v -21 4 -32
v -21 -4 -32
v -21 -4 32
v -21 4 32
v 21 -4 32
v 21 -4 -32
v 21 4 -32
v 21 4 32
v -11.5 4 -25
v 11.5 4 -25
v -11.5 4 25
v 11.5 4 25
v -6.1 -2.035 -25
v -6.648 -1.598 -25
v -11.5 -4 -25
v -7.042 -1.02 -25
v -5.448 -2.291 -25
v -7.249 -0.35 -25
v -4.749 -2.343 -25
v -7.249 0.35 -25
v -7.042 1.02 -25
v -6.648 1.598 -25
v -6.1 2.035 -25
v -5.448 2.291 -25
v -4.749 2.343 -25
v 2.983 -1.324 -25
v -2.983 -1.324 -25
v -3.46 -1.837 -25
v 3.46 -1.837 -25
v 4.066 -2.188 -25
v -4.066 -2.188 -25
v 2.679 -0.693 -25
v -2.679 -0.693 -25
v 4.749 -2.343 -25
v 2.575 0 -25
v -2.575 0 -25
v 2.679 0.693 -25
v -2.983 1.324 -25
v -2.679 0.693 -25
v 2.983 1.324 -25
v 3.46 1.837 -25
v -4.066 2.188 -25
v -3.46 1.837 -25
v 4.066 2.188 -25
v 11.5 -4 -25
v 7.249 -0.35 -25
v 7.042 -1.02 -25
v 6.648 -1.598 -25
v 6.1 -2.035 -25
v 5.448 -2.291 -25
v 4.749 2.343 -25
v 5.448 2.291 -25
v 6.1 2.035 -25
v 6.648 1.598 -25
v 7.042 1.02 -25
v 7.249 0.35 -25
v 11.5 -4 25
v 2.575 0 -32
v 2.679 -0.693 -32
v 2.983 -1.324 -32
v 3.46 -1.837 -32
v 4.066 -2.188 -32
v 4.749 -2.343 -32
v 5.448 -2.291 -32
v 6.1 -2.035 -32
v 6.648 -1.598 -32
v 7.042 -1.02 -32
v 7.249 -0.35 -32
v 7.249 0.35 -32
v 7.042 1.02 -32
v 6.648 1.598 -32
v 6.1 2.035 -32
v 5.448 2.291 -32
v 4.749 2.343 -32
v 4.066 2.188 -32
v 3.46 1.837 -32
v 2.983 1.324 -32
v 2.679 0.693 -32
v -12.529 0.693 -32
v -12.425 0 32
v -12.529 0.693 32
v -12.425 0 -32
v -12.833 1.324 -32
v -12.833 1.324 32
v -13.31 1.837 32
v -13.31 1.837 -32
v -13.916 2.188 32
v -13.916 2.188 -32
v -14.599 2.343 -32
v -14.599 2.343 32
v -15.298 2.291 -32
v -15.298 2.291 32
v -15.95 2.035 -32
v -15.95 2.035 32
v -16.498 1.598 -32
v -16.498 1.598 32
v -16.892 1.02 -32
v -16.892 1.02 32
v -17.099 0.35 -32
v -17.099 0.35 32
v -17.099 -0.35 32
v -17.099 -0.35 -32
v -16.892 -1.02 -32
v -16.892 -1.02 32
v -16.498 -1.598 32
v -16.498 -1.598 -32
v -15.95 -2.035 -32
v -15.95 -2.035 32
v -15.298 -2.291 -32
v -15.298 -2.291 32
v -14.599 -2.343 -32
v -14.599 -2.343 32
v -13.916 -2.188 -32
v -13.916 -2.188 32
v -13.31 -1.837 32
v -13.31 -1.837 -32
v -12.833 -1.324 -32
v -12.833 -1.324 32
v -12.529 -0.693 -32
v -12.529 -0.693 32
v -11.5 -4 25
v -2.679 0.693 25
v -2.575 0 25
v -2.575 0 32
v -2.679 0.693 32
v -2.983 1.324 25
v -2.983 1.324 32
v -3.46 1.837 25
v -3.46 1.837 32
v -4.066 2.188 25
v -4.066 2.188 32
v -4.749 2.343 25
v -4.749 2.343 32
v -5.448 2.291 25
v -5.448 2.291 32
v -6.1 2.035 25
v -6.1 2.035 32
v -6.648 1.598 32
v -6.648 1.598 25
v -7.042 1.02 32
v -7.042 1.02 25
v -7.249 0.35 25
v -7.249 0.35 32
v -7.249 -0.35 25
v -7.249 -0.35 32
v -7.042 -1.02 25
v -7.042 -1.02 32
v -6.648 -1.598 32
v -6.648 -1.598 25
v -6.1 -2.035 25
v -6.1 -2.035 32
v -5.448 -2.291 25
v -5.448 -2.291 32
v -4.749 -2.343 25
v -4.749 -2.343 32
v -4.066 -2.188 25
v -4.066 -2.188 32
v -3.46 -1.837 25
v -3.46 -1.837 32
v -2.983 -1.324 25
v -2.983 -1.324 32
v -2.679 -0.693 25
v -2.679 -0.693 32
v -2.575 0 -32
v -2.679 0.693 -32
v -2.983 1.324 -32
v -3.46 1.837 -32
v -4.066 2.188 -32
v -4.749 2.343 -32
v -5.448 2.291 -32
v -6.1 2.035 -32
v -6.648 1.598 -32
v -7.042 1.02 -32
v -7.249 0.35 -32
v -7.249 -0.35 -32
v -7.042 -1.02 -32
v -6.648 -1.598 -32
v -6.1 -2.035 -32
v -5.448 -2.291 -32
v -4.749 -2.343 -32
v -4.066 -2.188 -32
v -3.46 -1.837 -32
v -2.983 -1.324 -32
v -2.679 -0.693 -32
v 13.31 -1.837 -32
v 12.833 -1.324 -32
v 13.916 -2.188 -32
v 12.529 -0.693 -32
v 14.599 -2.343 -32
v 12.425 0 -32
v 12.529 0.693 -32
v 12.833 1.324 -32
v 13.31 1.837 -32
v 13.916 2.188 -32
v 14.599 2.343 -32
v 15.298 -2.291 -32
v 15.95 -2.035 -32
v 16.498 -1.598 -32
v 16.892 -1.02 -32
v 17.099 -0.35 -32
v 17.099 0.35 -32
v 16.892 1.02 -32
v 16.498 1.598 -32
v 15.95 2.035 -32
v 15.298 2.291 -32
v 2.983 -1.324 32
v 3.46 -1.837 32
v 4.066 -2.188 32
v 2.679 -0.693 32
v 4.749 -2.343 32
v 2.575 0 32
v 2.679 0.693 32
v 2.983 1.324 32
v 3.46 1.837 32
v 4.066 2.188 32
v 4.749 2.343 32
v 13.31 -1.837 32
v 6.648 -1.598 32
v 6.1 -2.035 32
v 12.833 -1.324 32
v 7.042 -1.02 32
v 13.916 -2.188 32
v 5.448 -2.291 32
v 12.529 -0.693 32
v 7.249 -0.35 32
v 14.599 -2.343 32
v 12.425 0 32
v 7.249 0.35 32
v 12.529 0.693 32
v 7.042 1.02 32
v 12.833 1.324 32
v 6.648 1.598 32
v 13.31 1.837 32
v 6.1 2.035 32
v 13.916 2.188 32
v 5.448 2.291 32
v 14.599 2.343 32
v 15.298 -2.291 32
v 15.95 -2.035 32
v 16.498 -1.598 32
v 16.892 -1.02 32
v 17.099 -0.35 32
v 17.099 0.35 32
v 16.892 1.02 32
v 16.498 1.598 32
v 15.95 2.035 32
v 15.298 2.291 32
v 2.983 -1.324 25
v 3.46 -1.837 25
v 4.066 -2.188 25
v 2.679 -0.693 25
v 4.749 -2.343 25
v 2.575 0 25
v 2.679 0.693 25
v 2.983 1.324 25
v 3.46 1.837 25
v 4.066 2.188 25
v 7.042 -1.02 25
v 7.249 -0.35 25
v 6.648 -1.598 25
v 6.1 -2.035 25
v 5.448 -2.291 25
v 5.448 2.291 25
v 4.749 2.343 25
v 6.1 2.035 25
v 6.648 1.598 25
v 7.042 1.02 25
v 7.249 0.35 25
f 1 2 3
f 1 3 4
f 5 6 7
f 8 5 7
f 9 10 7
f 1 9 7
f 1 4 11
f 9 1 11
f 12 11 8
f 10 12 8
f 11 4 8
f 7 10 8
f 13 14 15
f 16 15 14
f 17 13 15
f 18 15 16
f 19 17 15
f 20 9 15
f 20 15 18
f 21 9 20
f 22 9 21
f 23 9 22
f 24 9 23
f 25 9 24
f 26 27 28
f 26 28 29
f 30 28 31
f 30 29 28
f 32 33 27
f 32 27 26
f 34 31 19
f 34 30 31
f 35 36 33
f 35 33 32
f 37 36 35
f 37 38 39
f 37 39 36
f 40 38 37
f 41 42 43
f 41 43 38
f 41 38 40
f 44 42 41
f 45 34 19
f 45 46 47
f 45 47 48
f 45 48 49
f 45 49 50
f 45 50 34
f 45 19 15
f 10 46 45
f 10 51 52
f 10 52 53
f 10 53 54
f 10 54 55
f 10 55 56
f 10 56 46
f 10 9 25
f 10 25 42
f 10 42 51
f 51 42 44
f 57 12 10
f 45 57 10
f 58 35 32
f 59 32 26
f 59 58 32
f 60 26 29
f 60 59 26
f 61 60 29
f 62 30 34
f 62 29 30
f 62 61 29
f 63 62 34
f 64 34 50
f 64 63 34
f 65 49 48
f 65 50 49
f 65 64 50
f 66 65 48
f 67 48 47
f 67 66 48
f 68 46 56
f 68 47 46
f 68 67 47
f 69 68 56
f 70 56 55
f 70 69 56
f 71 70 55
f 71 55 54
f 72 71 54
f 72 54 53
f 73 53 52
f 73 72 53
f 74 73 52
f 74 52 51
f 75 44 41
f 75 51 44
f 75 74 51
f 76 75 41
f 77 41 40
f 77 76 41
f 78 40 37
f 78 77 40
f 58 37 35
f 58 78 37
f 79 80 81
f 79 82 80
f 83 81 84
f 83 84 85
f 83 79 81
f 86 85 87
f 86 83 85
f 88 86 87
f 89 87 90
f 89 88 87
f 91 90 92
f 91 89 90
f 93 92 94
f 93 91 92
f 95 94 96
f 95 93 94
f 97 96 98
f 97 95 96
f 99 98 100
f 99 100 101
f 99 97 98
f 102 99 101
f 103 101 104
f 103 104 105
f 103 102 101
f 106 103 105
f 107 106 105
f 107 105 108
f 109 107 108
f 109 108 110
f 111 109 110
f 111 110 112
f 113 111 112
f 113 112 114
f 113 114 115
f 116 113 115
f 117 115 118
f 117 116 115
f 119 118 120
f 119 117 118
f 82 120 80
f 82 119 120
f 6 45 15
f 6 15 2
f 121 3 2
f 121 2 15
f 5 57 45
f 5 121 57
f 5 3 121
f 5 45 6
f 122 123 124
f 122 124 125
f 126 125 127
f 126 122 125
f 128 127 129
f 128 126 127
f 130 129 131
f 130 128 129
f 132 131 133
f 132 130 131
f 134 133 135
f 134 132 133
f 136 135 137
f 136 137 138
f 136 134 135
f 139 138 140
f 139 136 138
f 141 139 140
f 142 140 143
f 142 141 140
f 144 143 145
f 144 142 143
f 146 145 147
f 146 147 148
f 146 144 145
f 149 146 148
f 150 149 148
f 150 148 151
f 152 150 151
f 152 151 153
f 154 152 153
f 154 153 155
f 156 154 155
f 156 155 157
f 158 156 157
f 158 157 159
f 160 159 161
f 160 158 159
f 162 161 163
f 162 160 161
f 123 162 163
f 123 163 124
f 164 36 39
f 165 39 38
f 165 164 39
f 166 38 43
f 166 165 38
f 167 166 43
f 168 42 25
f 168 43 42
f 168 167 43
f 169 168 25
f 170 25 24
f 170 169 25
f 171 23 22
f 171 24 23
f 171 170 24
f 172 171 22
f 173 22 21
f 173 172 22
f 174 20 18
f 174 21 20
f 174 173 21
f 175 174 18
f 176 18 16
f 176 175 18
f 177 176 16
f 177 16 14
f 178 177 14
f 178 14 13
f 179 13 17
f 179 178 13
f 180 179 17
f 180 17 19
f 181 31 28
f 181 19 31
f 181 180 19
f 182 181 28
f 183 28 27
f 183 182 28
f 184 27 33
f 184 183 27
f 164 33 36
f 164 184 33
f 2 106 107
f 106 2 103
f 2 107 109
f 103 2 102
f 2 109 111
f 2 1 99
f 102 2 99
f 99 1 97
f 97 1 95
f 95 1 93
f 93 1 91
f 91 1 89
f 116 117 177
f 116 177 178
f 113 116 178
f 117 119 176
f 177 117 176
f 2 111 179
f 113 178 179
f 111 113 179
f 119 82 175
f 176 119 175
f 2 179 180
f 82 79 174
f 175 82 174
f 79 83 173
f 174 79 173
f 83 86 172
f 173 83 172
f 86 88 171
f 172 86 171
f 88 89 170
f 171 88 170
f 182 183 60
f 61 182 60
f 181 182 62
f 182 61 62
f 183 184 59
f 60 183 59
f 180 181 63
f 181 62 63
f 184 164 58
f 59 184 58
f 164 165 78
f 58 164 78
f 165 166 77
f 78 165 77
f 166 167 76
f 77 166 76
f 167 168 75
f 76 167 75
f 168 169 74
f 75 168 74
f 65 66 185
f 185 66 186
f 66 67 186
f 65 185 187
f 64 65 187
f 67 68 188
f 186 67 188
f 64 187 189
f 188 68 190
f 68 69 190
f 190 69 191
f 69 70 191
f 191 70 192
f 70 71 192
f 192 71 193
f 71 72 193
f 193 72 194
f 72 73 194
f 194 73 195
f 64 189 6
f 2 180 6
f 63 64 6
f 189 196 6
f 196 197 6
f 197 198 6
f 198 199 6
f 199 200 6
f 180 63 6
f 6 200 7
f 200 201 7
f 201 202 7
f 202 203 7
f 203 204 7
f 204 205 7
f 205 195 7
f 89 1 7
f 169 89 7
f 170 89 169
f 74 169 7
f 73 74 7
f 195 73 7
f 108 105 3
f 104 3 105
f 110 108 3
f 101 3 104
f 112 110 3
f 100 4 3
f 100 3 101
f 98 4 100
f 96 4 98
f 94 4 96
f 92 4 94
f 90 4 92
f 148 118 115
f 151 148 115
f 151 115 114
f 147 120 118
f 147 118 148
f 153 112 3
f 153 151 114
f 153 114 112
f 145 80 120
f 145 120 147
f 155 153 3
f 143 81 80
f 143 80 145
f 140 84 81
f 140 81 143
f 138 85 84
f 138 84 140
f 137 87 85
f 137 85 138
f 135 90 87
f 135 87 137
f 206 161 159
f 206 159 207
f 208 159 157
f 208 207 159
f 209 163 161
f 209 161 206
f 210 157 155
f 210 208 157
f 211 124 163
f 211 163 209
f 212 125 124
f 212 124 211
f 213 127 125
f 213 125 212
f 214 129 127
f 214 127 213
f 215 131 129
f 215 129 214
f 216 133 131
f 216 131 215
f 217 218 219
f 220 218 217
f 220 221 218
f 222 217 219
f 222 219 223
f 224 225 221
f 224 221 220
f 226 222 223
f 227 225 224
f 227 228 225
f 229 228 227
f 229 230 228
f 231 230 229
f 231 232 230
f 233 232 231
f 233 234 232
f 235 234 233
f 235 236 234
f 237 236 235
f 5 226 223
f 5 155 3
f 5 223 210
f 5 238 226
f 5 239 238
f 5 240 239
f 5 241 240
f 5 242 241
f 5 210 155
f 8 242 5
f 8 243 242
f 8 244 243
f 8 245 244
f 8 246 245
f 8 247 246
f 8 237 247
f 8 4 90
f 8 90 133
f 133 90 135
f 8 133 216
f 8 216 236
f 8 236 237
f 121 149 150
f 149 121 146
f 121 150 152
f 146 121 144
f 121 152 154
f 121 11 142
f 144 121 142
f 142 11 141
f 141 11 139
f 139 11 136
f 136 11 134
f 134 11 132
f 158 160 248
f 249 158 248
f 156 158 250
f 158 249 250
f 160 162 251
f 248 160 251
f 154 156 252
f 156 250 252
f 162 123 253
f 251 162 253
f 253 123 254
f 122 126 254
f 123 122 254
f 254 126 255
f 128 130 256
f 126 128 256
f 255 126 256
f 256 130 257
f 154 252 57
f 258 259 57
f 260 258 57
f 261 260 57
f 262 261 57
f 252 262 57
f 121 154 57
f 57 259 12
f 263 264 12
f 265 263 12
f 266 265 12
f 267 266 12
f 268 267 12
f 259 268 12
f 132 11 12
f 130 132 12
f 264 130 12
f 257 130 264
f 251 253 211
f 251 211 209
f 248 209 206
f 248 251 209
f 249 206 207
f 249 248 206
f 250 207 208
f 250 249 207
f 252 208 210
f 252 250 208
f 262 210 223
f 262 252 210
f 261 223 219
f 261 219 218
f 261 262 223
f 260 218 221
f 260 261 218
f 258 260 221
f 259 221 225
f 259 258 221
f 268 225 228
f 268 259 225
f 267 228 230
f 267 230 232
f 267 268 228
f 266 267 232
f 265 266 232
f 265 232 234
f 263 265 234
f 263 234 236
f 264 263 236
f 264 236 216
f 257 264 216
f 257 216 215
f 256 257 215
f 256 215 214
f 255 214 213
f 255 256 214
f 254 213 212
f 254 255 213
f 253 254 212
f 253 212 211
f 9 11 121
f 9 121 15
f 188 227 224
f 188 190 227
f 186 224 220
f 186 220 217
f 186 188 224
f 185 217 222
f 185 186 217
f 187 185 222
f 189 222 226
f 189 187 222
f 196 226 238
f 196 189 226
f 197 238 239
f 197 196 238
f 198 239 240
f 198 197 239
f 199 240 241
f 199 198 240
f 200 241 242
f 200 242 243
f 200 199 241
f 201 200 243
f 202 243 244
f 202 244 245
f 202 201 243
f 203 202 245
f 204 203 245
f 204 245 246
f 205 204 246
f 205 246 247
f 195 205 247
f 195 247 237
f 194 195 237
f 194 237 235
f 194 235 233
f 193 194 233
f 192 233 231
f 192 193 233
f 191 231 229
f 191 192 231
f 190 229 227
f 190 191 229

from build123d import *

# Parameters (mm, degrees)
SKETCH_1_W          = 42
SKETCH_1_H          = 8
SKETCH_1_R          = 2.35
EXTRUDE_1_DEPTH     = 32
SKETCH_2_W          = 23
SKETCH_2_H          = 20
CUT_EXTRUDE_2_DEPTH = 14
SKETCH_3_W          = 23
SKETCH_3_H          = 27.182471636
CUT_EXTRUDE_3_DEPTH = 10


with BuildPart() as part:
    # 草图1 → 凸台-拉伸1 (new, symmetric)
    with BuildSketch(Plane.XY):
        Rectangle(SKETCH_1_W, SKETCH_1_H)
        with Locations((-4.925, 0)):
            Circle(SKETCH_1_R, mode=Mode.SUBTRACT)
        with Locations(Location((4.925, 0, 0), (0, 0, 180))):
            Circle(SKETCH_1_R, mode=Mode.SUBTRACT)
        with Locations((-14.775, 0)):
            Circle(SKETCH_1_R, mode=Mode.SUBTRACT)
        with Locations(Location((14.775, 0, 0), (0, 0, 180))):
            Circle(SKETCH_1_R, mode=Mode.SUBTRACT)
    extrude(amount=EXTRUDE_1_DEPTH, both=True)

    # 草图2 → 切除-拉伸2 (cut)
    with BuildSketch(Plane(origin=(0, 4, 0), x_dir=(1, 0, 0), z_dir=(0, 1, 0))):
        with Locations((0, -15)):
            Rectangle(SKETCH_2_W, SKETCH_2_H)
        with Locations((0, 15)):
            Rectangle(SKETCH_2_W, SKETCH_2_H)
    extrude(amount=-CUT_EXTRUDE_2_DEPTH, mode=Mode.SUBTRACT)

    # 草图3 → 切除-拉伸3 (cut)
    with BuildSketch(Plane(origin=(0, 4, 0), x_dir=(1, 0, 0), z_dir=(0, 1, 0))):
        Rectangle(SKETCH_3_W, SKETCH_3_H)
    extrude(amount=-CUT_EXTRUDE_3_DEPTH, mode=Mode.SUBTRACT)


solid = part.part
